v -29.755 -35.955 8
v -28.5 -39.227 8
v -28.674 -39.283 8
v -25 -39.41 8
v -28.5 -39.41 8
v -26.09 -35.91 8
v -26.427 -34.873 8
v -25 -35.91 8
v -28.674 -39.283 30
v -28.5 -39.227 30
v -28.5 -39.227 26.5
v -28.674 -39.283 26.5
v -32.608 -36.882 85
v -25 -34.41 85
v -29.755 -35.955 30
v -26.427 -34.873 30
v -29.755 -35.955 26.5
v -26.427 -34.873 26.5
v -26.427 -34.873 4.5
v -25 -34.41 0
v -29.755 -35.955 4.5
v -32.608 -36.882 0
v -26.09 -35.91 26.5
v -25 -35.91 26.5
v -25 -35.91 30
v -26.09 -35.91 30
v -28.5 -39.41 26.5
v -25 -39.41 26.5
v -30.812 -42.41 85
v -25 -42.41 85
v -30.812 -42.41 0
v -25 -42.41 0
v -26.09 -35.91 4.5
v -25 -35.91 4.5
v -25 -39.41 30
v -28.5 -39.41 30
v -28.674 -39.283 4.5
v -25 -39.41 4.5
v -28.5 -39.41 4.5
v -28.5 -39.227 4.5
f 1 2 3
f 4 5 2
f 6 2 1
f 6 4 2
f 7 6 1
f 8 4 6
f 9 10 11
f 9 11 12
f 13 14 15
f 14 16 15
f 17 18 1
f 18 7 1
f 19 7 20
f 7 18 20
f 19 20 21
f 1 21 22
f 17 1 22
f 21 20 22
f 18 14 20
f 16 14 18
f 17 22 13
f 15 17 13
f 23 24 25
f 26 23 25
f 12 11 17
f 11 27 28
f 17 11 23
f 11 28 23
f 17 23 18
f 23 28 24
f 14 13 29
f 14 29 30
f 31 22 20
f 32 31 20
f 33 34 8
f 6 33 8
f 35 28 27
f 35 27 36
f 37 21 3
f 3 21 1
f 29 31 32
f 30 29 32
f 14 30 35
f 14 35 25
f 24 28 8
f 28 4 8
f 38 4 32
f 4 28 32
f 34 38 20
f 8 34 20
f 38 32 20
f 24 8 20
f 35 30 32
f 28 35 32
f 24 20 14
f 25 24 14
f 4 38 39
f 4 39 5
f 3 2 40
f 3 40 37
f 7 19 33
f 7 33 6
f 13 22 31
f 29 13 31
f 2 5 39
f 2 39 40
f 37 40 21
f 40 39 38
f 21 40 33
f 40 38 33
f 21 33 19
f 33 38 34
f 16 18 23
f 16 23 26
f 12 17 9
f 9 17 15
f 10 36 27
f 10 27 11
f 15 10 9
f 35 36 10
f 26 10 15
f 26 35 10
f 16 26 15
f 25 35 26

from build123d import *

# Parameters (mm, degrees)
F1_DEPTH = 85
F2_W     = 3.5
F2_H     = 3.5
F3_DEPTH = 3.5
F4_W     = 3.5
F4_H     = 3.5
F5_DEPTH = 3.5


with BuildPart() as f1:
    # F0 (on Top) → F1 (new body)
    with BuildSketch(Plane.XY):
        Polygon((-25, -42.409548), (-25, -34.409548), (-32.608452, -36.881684), (-30.81234, -42.409548), align=None)
    extrude(amount=F1_DEPTH)

    # F2 (on face) → F3 (cut)
    with BuildSketch(Plane.YZ.offset(-25)):
        with Locations((-37.659548, 6.25)):
            Rectangle(F2_W, F2_H)
        with Locations((-37.659548, 28.25)):
            Rectangle(F2_W, F2_H)
    extrude(amount=-F3_DEPTH, mode=Mode.SUBTRACT)

    # F4 (on face) → F5 (cut)
    with BuildSketch(Plane(origin=(7.725425, -23.776413, 0), x_dir=(-0.951057, -0.309017, 0), z_dir=(-0.309017, 0.951057, 0))):
        with Locations((37.659548, 6.25)):
            Rectangle(F4_W, F4_H)
        with Locations((37.659548, 28.25)):
            Rectangle(F4_W, F4_H)
    extrude(amount=-F5_DEPTH, mode=Mode.SUBTRACT)


solid = f1.part
